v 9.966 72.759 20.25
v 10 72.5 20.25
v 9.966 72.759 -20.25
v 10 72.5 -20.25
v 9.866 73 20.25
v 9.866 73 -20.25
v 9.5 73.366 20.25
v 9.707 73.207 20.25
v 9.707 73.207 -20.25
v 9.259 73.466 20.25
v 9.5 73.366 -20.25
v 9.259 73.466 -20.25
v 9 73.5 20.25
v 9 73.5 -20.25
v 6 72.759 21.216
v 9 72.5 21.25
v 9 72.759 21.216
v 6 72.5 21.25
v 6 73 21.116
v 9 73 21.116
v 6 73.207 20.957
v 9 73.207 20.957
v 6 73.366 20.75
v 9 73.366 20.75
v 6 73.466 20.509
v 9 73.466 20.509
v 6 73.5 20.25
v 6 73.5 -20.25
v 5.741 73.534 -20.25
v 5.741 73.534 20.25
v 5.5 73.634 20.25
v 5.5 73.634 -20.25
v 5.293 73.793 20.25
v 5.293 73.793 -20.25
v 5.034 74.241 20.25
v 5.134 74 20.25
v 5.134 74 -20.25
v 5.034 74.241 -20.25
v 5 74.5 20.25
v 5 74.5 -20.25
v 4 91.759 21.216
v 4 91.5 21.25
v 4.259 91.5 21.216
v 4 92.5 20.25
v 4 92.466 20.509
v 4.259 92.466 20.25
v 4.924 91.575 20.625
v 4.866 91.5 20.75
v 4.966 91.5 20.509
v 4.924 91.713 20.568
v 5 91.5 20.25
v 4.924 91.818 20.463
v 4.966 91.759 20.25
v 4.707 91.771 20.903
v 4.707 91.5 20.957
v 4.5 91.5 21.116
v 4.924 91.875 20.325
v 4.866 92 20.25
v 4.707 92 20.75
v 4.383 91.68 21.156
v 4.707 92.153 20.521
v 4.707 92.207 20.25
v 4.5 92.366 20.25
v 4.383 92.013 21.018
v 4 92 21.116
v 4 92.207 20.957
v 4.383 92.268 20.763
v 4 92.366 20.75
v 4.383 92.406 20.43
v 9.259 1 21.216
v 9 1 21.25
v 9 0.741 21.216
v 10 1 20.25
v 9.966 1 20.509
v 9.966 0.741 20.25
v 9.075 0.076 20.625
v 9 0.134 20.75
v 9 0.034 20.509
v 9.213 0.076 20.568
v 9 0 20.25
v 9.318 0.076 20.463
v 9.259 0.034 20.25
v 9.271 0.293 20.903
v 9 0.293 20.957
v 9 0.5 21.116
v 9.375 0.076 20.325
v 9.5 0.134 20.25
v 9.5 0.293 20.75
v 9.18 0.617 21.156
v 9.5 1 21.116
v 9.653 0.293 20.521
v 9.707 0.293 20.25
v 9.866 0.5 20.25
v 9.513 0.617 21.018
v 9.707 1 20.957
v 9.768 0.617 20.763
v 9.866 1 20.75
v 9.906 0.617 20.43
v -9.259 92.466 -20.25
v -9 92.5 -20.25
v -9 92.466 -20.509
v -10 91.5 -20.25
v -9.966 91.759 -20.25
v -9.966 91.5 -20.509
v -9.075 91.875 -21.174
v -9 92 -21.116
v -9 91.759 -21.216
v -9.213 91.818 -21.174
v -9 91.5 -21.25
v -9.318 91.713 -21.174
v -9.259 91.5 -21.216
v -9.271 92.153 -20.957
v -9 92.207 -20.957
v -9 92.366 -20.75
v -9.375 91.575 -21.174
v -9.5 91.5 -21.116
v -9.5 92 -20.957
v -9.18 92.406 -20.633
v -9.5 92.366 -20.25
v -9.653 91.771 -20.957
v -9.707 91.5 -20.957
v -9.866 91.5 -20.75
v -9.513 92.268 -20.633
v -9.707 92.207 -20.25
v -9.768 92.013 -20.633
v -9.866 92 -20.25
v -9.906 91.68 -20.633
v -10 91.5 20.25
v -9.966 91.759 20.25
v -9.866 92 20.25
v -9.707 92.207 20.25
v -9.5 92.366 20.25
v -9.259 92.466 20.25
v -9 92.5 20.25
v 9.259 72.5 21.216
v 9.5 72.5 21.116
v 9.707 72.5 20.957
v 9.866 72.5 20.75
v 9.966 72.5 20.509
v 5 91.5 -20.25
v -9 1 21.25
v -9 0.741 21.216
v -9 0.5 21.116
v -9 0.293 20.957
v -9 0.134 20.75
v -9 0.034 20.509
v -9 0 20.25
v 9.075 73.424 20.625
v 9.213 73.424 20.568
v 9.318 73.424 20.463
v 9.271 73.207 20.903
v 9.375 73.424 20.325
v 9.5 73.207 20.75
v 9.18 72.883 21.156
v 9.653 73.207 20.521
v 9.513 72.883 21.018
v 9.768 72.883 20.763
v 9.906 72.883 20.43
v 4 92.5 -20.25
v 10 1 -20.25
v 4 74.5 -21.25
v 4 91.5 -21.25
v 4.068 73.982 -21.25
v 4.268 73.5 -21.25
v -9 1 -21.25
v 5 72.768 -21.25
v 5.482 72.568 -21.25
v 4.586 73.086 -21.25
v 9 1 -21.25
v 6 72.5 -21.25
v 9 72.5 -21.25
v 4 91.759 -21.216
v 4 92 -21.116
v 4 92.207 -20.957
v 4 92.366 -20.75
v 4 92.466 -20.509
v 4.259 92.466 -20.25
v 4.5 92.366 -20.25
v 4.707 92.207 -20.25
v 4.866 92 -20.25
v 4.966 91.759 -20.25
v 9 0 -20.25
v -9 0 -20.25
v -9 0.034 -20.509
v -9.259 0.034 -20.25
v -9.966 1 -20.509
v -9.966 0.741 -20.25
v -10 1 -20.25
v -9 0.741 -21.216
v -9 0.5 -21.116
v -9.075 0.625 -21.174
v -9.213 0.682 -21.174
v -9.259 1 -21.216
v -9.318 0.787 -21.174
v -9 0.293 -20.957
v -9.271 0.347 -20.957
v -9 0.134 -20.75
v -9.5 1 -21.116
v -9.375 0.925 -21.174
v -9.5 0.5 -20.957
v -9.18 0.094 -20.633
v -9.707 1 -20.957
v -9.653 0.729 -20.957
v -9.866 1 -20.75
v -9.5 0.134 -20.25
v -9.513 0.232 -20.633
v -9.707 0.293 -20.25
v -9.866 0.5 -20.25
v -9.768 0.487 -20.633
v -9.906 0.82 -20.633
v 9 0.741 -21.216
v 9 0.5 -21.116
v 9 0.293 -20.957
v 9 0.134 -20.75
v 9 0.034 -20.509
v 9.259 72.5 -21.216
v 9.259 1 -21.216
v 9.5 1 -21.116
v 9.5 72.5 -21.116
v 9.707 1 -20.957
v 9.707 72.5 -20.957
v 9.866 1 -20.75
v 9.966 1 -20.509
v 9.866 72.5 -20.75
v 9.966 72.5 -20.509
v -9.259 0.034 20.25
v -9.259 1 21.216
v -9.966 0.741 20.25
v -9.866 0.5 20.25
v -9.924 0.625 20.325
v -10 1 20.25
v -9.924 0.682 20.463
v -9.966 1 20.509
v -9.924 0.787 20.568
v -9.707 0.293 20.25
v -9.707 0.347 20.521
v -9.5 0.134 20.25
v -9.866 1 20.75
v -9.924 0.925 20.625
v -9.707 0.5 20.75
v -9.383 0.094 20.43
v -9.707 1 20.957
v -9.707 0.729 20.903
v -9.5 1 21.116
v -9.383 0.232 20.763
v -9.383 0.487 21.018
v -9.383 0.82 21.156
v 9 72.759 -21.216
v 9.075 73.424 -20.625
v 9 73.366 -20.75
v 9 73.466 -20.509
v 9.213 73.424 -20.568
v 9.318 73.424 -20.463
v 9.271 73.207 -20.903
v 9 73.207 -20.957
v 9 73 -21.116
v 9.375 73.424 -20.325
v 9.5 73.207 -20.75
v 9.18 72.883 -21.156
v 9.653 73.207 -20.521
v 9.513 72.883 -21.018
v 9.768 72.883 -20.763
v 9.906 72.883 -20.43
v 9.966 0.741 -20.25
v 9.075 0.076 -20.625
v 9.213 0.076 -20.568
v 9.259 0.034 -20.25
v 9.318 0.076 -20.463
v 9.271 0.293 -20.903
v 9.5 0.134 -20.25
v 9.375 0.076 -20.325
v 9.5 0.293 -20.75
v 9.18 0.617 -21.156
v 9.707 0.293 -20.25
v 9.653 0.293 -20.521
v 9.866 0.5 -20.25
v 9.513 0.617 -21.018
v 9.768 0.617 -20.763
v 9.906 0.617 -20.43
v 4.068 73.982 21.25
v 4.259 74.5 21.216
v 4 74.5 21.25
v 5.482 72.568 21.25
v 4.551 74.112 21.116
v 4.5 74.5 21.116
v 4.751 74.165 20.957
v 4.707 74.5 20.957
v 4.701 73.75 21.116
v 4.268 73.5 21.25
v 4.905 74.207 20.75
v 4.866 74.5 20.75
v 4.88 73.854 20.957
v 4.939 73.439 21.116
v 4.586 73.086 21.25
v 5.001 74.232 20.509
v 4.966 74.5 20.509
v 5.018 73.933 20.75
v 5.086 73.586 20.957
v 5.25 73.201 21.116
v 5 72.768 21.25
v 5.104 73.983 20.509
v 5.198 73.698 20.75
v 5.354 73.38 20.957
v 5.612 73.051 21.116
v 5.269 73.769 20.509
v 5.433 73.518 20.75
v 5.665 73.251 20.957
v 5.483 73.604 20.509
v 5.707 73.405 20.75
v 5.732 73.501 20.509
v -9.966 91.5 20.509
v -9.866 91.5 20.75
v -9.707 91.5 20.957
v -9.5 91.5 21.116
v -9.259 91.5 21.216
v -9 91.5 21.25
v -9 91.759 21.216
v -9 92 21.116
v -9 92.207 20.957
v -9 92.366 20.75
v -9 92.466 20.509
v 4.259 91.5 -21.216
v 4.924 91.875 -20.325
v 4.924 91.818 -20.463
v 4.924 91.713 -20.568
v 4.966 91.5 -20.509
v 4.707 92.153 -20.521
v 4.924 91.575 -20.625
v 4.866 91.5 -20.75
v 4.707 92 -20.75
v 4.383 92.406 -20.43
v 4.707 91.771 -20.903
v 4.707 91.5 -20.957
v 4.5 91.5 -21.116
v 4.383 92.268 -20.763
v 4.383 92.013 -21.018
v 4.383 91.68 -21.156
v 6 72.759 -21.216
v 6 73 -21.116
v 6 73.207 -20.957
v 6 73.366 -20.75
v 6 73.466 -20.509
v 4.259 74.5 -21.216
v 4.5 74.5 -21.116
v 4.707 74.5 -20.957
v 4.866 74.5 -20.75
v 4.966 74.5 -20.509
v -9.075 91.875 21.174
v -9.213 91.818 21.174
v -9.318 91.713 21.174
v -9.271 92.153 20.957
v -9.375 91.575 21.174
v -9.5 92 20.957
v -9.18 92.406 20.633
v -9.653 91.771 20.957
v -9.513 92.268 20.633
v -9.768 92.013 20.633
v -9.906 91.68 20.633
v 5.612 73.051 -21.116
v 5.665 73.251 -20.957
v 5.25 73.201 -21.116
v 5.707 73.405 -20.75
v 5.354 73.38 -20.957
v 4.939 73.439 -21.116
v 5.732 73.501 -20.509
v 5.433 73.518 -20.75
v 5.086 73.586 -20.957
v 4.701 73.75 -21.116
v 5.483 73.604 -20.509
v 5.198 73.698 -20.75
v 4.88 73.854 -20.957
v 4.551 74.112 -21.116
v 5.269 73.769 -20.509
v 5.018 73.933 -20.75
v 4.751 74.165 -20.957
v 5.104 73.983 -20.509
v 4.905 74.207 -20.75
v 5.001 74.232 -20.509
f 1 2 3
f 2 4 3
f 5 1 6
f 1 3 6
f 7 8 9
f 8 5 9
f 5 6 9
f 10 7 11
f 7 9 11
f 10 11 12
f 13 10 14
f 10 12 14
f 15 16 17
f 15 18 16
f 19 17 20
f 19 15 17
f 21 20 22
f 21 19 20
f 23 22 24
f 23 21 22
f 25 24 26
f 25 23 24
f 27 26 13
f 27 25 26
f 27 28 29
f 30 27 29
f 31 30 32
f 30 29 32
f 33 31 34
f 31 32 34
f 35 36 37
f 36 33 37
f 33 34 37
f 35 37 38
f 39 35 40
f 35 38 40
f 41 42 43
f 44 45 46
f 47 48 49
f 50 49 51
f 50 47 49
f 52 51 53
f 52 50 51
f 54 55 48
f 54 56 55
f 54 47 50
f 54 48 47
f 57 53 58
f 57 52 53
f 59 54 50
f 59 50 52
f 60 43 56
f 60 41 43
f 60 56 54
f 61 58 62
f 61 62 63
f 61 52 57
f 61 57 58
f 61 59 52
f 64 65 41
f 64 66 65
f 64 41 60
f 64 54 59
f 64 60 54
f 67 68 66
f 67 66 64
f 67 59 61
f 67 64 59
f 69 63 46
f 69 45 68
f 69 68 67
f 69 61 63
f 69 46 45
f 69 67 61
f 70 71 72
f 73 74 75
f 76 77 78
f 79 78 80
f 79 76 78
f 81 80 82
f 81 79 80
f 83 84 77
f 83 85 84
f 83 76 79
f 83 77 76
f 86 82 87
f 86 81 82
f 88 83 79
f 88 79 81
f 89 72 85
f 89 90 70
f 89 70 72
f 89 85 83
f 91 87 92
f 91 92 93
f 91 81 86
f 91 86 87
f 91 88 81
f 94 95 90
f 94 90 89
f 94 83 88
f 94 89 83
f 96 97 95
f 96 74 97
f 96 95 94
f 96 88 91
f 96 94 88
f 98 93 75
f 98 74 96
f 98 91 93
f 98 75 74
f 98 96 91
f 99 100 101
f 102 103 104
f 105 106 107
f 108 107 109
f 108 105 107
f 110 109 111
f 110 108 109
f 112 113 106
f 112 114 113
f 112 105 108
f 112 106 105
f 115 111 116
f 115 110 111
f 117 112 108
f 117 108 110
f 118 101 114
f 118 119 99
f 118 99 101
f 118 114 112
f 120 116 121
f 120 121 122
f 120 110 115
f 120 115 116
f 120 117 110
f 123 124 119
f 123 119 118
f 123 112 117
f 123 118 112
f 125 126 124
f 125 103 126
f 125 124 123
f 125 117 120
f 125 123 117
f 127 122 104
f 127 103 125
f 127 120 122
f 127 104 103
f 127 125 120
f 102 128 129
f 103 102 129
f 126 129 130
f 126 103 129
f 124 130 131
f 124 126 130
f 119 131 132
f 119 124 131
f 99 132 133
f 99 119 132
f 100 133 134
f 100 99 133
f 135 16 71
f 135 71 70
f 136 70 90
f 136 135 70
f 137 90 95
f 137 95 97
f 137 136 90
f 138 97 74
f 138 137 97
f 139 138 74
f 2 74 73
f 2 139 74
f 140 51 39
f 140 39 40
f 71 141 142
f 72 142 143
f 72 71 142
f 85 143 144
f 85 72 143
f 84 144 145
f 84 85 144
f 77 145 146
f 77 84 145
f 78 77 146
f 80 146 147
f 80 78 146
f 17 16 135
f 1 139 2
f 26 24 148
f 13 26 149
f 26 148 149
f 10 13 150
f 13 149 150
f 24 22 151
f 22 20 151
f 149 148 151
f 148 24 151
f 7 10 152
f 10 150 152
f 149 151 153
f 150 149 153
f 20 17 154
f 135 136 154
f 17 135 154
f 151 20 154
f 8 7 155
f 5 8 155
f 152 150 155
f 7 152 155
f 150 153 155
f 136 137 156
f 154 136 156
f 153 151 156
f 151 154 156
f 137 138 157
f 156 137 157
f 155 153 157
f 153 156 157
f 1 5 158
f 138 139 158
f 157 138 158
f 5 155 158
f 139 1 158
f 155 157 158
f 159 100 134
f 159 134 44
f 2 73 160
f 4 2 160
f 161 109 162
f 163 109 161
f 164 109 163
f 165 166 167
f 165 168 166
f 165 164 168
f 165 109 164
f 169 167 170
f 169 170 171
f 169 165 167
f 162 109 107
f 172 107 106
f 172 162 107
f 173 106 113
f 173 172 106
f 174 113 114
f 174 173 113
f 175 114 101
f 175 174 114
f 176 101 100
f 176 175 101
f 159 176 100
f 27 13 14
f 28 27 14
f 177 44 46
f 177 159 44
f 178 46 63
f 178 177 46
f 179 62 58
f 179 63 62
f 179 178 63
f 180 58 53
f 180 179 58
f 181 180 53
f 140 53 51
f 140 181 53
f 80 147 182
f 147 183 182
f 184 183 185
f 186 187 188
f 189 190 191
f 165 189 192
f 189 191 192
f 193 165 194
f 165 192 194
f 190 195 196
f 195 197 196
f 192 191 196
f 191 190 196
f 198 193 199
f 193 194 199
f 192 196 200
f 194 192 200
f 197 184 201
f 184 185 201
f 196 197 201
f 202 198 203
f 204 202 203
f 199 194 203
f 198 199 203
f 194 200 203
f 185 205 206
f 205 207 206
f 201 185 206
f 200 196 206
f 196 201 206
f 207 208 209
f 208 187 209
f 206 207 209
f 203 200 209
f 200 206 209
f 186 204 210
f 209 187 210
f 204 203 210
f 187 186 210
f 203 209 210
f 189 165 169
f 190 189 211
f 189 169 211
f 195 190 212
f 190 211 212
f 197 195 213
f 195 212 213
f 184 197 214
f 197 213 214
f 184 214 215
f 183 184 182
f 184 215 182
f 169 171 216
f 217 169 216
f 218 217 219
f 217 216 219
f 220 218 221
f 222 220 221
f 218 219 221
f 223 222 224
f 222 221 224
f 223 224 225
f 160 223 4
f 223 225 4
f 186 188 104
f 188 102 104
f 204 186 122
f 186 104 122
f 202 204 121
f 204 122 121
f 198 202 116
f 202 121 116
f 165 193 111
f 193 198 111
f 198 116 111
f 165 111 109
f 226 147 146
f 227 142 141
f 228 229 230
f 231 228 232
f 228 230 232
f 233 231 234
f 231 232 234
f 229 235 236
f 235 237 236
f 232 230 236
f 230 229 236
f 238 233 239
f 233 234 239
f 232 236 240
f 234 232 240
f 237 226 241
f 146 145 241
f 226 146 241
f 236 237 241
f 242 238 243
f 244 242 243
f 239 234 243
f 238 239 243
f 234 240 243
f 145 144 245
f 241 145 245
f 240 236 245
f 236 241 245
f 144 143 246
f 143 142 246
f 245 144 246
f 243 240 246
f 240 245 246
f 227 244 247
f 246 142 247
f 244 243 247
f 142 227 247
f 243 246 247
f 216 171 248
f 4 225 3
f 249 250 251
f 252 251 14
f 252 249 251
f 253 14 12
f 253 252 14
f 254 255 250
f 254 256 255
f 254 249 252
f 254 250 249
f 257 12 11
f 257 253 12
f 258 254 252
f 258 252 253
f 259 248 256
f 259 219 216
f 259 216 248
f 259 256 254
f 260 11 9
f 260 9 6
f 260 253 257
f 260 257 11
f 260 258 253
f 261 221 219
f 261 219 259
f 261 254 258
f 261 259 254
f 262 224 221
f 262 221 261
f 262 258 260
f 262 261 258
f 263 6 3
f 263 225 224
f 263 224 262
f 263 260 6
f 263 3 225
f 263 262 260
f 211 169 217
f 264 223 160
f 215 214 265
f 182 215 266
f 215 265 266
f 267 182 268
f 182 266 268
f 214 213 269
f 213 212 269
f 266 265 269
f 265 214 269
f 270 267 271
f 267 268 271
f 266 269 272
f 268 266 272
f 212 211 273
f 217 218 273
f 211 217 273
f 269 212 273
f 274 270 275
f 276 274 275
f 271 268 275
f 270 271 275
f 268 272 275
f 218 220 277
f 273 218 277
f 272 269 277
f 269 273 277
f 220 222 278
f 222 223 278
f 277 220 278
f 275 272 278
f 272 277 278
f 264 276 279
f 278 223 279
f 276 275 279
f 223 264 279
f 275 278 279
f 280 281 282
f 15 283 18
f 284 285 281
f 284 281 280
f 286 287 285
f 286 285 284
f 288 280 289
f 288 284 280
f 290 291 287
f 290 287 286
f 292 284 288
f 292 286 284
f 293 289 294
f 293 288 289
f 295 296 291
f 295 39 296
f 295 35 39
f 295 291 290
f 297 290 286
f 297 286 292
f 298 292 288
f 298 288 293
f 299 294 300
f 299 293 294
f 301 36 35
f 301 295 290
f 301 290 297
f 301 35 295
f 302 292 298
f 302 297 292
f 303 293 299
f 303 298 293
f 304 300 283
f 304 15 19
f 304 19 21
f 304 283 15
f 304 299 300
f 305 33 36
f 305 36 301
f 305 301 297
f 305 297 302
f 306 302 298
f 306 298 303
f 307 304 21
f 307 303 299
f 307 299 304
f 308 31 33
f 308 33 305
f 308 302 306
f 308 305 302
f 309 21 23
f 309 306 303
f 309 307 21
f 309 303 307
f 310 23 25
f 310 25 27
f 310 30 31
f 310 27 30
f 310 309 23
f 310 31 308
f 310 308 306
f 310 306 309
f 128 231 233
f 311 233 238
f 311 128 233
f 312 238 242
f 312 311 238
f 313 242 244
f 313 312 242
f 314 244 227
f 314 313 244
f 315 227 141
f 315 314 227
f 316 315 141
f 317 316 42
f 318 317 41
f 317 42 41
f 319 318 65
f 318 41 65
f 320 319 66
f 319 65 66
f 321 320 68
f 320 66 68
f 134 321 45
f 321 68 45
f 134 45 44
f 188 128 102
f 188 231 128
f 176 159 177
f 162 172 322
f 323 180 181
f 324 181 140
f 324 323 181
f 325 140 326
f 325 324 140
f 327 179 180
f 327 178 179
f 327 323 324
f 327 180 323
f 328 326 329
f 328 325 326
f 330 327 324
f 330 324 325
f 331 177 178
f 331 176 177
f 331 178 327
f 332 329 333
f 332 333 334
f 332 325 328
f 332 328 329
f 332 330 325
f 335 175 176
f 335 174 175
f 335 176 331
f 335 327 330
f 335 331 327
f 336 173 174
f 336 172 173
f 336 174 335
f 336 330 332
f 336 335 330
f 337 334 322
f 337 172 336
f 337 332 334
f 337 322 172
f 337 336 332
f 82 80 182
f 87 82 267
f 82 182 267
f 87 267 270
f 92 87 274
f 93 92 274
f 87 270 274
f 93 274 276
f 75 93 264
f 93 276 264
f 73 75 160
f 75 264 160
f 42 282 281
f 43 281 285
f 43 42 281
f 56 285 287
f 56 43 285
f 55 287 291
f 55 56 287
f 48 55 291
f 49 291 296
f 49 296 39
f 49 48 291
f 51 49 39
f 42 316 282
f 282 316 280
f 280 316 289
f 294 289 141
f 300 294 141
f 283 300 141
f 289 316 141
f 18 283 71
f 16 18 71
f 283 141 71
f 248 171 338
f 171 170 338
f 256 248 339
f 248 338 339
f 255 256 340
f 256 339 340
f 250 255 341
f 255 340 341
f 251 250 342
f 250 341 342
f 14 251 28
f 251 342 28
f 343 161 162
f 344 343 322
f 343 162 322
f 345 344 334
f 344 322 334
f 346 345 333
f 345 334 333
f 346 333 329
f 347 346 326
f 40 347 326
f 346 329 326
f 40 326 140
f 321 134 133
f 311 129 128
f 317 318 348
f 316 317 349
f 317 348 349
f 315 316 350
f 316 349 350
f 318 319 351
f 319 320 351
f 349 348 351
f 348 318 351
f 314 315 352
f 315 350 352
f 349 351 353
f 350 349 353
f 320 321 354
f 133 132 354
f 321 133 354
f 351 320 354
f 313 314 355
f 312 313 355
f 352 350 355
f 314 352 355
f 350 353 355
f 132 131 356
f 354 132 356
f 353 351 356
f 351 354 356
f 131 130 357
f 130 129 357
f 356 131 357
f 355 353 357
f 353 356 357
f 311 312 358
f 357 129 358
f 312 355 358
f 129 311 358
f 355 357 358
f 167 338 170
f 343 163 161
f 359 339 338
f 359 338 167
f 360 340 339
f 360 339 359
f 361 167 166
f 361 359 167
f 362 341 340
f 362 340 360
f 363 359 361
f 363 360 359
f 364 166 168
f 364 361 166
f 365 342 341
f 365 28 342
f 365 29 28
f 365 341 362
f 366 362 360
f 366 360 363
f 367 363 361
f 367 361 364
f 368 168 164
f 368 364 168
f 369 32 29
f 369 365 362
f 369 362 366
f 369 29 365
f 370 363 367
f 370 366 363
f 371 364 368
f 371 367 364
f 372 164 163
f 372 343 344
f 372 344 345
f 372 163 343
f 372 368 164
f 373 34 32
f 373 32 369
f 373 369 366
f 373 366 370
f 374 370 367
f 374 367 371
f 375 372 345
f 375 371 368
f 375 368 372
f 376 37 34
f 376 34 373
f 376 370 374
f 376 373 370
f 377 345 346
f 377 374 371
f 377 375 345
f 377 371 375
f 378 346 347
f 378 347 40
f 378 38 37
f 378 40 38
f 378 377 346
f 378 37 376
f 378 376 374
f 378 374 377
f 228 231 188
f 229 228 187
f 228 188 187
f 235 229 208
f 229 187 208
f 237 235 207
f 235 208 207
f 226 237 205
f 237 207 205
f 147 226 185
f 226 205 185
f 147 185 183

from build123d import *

# Parameters (mm, degrees)
SKETCH_1_W          = 20
SKETCH_1_H          = 42.5
EXTRUDE_1_DEPTH     = 92.5
SKETCH_3_W          = 42.5
SKETCH_3_H          = 19
CUT_EXTRUDE_1_DEPTH = 5
FILLET_1_R          = 1


with BuildPart() as part:
    # 草图1 → 凸台-拉伸1 (new body)
    with BuildSketch(Plane(origin=(0, 0, 0), x_dir=(1, 0, 0), z_dir=(0, 1, 0))):
        Rectangle(SKETCH_1_W, SKETCH_1_H)
    extrude(amount=EXTRUDE_1_DEPTH)

    # 草图3 → 切除-拉伸1 (cut)
    with BuildSketch(Plane(origin=(10, 0, 0), x_dir=(0, 0, -1), z_dir=(1, 0, 0))):
        with Locations((0, 83)):
            Rectangle(SKETCH_3_W, SKETCH_3_H)
    extrude(amount=-CUT_EXTRUDE_1_DEPTH, mode=Mode.SUBTRACT)

    # 圆角1
    fillet_1_edges = [part.edges().sort_by_distance(p)[0] for p in [
        (-10, 92.5, 0),
        (-2.5, 92.5, -21.25),
        (10, 36.75, 21.25),
        (-2.5, 92.5, 21.25),
        (10, 36.75, -21.25),
        (5, 83, 21.25),
        (7.5, 73.5, 21.25),
        (5, 92.5, 0),
        (5, 83, -21.25),
        (5, 73.5, 0),
        (7.5, 73.5, -21.25),
        (10, 73.5, 0),
        (0, 0, 21.25),
        (-10, 0, 0),
        (0, 0, -21.25),
        (10, 0, 0),
        (-10, 46.25, 21.25),
        (-10, 46.25, -21.25),
    ]]
    fillet(fillet_1_edges, radius=FILLET_1_R)


solid = part.part
